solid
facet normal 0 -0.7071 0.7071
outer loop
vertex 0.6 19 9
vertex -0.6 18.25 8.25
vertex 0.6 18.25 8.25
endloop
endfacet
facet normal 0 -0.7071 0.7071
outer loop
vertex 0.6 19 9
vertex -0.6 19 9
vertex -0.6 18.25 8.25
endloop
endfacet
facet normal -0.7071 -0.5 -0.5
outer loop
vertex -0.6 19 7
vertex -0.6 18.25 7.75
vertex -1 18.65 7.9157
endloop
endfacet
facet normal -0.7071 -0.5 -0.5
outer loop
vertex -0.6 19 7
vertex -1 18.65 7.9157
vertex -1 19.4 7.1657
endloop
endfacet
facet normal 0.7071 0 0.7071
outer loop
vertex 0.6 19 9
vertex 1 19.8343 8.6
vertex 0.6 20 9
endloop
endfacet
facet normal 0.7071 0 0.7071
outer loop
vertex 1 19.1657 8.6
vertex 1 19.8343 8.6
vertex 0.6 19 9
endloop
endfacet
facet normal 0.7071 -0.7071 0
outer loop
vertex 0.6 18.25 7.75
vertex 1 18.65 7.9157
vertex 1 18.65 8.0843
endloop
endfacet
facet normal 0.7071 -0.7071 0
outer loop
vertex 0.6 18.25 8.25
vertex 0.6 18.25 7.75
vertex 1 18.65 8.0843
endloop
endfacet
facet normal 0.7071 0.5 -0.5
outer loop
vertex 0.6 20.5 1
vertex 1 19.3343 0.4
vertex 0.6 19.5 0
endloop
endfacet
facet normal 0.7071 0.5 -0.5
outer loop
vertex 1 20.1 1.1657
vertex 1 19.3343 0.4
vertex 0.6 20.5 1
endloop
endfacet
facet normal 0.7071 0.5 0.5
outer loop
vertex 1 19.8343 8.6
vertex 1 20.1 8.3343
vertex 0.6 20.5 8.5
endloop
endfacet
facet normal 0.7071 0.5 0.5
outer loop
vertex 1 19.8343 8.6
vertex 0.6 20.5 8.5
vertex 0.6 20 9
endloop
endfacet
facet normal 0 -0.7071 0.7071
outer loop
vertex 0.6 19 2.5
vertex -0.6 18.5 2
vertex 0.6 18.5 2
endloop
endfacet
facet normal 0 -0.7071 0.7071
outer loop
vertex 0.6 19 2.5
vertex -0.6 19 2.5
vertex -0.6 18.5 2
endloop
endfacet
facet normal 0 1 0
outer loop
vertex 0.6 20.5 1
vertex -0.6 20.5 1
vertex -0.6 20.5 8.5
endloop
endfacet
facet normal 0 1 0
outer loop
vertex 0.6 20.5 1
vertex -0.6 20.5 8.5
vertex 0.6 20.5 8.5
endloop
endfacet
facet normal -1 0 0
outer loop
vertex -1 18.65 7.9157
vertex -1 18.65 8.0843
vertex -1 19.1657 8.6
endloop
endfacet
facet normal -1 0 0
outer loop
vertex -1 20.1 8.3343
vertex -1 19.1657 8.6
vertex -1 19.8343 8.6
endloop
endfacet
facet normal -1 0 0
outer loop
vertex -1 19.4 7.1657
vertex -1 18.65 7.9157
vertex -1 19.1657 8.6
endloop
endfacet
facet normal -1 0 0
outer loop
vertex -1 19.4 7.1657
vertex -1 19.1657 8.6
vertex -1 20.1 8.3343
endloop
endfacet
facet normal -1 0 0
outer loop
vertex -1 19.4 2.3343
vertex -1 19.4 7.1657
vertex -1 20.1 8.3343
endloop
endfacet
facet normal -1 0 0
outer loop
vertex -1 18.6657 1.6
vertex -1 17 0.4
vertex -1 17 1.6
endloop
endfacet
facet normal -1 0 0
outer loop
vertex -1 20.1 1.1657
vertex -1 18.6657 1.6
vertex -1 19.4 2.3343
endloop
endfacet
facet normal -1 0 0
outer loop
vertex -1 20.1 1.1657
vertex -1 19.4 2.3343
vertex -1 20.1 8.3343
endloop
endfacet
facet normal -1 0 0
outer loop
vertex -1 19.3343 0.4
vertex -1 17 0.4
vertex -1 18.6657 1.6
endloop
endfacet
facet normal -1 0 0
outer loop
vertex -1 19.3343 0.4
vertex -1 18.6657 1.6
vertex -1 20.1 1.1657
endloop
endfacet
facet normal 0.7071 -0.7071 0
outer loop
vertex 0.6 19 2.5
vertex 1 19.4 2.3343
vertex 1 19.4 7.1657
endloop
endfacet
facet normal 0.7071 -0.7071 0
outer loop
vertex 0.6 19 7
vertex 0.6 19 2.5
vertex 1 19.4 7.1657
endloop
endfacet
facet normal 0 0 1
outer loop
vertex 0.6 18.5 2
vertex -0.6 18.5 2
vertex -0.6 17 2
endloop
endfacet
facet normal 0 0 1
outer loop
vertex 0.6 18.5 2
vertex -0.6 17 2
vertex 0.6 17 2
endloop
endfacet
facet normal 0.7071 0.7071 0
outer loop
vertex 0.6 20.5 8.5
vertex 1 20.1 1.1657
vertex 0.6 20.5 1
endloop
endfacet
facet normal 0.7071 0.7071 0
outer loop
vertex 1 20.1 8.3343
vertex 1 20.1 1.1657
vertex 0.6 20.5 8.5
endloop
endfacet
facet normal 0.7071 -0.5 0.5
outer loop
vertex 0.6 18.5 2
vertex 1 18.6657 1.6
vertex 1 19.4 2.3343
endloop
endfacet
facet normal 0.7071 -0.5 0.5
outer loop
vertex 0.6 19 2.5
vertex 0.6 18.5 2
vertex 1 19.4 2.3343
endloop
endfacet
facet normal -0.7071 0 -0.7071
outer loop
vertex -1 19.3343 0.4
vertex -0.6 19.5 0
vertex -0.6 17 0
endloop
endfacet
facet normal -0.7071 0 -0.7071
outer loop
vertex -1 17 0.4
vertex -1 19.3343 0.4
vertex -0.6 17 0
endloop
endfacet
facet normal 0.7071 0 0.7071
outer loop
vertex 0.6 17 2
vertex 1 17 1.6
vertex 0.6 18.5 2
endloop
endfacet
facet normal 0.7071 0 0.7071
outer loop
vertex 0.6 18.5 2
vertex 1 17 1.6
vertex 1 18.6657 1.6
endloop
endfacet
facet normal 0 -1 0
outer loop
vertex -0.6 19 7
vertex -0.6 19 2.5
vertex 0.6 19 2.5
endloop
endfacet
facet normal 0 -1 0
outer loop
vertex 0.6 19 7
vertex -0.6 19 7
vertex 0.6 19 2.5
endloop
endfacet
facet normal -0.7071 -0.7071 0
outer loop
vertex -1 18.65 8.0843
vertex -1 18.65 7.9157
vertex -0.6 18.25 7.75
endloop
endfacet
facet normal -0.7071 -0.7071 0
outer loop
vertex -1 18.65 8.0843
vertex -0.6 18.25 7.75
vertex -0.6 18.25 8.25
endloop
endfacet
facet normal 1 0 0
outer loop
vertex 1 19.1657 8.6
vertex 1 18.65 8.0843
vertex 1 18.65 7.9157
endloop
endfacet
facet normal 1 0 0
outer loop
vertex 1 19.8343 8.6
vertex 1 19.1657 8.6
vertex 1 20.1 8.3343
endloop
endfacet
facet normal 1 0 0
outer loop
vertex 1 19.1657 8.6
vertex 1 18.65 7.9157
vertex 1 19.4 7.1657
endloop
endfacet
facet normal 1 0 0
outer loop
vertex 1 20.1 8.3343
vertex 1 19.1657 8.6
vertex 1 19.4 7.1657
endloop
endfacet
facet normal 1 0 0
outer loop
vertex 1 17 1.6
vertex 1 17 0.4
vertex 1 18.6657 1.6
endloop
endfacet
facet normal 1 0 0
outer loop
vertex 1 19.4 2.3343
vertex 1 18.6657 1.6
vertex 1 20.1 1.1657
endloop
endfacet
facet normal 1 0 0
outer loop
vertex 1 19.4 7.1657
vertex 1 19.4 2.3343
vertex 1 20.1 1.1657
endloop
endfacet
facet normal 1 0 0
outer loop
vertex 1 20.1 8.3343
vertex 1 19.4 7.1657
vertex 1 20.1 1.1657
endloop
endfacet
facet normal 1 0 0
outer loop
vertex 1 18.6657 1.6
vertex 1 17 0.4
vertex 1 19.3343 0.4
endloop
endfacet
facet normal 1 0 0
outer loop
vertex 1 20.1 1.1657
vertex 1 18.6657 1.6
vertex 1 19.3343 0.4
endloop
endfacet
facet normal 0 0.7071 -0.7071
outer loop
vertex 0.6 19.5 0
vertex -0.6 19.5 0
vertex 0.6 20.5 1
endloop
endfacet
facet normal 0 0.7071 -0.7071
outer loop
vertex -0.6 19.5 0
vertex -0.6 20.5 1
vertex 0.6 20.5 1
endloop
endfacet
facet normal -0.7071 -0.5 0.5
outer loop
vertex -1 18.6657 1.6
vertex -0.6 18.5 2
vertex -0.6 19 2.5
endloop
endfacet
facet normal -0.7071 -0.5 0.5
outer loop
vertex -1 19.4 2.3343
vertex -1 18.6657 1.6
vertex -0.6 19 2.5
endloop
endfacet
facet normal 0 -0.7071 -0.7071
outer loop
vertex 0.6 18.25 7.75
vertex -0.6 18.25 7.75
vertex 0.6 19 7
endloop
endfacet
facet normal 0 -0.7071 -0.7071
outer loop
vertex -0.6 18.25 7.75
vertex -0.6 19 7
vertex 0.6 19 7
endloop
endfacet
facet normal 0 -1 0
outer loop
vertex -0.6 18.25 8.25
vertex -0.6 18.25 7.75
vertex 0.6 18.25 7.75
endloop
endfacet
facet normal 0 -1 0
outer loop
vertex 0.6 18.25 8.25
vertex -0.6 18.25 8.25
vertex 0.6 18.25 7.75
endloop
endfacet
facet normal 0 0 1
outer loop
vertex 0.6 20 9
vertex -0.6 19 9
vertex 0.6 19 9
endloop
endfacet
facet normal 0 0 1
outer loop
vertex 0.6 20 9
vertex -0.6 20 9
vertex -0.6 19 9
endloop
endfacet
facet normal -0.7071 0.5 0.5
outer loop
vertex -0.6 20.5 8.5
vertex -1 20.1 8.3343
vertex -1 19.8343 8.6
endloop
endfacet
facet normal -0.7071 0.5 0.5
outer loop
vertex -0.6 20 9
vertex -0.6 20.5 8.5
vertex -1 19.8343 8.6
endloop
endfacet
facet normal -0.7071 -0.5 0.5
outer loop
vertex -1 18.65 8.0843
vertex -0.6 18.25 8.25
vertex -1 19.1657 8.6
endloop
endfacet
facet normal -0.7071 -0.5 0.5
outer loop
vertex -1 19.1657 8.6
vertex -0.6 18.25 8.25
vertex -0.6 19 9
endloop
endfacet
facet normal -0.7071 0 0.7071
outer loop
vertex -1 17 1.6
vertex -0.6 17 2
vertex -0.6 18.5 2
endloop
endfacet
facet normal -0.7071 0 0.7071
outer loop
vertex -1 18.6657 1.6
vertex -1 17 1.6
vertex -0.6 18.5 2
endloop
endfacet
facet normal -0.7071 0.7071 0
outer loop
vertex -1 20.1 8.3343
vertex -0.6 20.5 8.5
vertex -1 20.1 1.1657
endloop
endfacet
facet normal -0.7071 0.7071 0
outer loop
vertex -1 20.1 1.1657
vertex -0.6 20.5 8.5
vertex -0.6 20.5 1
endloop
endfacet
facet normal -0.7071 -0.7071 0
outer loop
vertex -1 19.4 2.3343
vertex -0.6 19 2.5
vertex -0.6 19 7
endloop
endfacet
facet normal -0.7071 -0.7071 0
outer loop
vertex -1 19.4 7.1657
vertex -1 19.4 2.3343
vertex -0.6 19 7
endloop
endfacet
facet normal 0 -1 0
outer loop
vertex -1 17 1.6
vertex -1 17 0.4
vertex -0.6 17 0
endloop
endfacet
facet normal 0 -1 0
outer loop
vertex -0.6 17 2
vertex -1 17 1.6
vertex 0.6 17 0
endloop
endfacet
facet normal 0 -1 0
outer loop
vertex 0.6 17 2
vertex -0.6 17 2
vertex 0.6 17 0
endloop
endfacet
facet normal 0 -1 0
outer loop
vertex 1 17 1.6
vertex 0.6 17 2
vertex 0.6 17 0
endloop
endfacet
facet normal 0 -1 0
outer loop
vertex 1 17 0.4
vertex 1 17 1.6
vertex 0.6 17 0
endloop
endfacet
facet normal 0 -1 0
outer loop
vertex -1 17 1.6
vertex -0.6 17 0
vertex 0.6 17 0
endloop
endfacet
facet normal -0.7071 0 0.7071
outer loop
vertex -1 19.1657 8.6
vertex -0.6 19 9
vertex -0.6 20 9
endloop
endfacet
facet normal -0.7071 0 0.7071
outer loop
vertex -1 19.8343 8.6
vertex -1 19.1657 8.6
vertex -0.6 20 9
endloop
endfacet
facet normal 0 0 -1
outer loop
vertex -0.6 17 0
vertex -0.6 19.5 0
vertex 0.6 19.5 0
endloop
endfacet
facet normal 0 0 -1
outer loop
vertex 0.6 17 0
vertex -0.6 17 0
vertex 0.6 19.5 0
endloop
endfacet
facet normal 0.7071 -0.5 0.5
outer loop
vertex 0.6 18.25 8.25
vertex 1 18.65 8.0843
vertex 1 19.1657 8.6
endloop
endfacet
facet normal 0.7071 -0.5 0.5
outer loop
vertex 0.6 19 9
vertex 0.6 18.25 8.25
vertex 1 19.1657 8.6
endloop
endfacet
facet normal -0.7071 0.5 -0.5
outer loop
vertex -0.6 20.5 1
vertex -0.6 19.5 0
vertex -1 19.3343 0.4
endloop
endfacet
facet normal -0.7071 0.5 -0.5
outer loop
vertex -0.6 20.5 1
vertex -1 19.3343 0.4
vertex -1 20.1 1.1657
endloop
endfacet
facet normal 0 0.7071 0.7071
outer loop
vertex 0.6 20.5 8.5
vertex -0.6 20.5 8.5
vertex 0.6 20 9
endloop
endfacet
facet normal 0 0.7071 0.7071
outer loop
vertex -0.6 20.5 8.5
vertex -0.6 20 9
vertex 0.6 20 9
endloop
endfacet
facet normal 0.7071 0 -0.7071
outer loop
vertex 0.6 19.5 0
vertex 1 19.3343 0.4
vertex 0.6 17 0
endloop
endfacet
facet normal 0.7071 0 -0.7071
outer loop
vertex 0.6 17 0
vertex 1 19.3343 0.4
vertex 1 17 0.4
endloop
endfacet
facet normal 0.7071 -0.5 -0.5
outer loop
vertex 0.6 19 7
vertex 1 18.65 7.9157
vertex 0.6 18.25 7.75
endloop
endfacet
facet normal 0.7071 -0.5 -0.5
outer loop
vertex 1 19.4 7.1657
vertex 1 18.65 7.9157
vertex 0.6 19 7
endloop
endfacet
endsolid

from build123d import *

# Parameters (mm, degrees)
BOX002_W        = 2
BOX002_H        = 1.5
BOX002_DEPTH    = 2
CHAMFER003_SIZE = 0.75
BOX_W           = 2
BOX_H           = 3.5
BOX_DEPTH       = 2
BOX001_W        = 2
BOX001_H        = 1.5
BOX001_DEPTH    = 9
CHAMFER004_SIZE = 0.5
CHAMFER005_SIZE = 1
CHAMFER006_SIZE = 0.5
CHAMFER007_SIZE = 0.4


with BuildPart() as chamfer003:
    # Box002 → Box002 (new body)
    with BuildSketch(Plane(origin=(-1, 18.25, 7), x_dir=(1, 0, 0), z_dir=(0, 0, 1))):
        with Locations((1, 0.75)):
            Rectangle(BOX002_W, BOX002_H)
    extrude(amount=BOX002_DEPTH)

    # Chamfer003
    chamfer003_edges = [chamfer003.edges().sort_by_distance(p)[0] for p in [
        (0, 18.25, 7),
        (0, 18.25, 9),
    ]]
    chamfer(chamfer003_edges, length=CHAMFER003_SIZE)


with BuildPart() as cube:
    # Box → Box (new body)
    with BuildSketch(Plane(origin=(-1, 17, 0), x_dir=(1, 0, 0), z_dir=(0, 0, 1))):
        with Locations((1, 1.75)):
            Rectangle(BOX_W, BOX_H)
    extrude(amount=BOX_DEPTH)


with BuildPart() as chamfer007:
    # Box001 → Box001 (new body)
    with BuildSketch(Plane(origin=(-1, 19, 0), x_dir=(1, 0, 0), z_dir=(0, 0, 1))):
        with Locations((1, 0.75)):
            Rectangle(BOX001_W, BOX001_H)
    extrude(amount=BOX001_DEPTH)

    # Chamfer004
    chamfer004_edges = [chamfer007.edges().sort_by_distance(p)[0] for p in [
        (0, 20.5, 9),
    ]]
    chamfer(chamfer004_edges, length=CHAMFER004_SIZE)

    # Fusion: union Chamfer003, Cube
    add(chamfer003.part)
    add(cube.part)

    # Chamfer005
    chamfer005_edges = [chamfer007.edges().sort_by_distance(p)[0] for p in [
        (0, 20.5, 0),
    ]]
    chamfer(chamfer005_edges, length=CHAMFER005_SIZE)

    # Chamfer006
    chamfer006_edges = [chamfer007.edges().sort_by_distance(p)[0] for p in [
        (0, 19, 2),
    ]]
    chamfer(chamfer006_edges, length=CHAMFER006_SIZE)

    # Chamfer007
    chamfer007_edges = [chamfer007.edges().sort_by_distance(p)[0] for p in [
        (-1, 17.75, 2),
        (-1, 18.75, 2.25),
        (-1, 19, 4.75),
        (-1, 18.625, 7.375),
        (-1, 18.25, 8),
        (-1, 18.625, 8.625),
        (-1, 19.5, 9),
        (-1, 20.25, 8.75),
        (-1, 20.5, 4.75),
        (-1, 20, 0.5),
        (-1, 18.25, 0),
        (1, 17.75, 2),
        (1, 18.75, 2.25),
        (1, 19, 4.75),
        (1, 18.25, 0),
        (1, 18.625, 7.375),
        (1, 20, 0.5),
        (1, 18.25, 8),
        (1, 20.5, 4.75),
        (1, 18.625, 8.625),
        (1, 20.25, 8.75),
        (1, 19.5, 9),
    ]]
    chamfer(chamfer007_edges, length=CHAMFER007_SIZE)


solid = chamfer007.part
